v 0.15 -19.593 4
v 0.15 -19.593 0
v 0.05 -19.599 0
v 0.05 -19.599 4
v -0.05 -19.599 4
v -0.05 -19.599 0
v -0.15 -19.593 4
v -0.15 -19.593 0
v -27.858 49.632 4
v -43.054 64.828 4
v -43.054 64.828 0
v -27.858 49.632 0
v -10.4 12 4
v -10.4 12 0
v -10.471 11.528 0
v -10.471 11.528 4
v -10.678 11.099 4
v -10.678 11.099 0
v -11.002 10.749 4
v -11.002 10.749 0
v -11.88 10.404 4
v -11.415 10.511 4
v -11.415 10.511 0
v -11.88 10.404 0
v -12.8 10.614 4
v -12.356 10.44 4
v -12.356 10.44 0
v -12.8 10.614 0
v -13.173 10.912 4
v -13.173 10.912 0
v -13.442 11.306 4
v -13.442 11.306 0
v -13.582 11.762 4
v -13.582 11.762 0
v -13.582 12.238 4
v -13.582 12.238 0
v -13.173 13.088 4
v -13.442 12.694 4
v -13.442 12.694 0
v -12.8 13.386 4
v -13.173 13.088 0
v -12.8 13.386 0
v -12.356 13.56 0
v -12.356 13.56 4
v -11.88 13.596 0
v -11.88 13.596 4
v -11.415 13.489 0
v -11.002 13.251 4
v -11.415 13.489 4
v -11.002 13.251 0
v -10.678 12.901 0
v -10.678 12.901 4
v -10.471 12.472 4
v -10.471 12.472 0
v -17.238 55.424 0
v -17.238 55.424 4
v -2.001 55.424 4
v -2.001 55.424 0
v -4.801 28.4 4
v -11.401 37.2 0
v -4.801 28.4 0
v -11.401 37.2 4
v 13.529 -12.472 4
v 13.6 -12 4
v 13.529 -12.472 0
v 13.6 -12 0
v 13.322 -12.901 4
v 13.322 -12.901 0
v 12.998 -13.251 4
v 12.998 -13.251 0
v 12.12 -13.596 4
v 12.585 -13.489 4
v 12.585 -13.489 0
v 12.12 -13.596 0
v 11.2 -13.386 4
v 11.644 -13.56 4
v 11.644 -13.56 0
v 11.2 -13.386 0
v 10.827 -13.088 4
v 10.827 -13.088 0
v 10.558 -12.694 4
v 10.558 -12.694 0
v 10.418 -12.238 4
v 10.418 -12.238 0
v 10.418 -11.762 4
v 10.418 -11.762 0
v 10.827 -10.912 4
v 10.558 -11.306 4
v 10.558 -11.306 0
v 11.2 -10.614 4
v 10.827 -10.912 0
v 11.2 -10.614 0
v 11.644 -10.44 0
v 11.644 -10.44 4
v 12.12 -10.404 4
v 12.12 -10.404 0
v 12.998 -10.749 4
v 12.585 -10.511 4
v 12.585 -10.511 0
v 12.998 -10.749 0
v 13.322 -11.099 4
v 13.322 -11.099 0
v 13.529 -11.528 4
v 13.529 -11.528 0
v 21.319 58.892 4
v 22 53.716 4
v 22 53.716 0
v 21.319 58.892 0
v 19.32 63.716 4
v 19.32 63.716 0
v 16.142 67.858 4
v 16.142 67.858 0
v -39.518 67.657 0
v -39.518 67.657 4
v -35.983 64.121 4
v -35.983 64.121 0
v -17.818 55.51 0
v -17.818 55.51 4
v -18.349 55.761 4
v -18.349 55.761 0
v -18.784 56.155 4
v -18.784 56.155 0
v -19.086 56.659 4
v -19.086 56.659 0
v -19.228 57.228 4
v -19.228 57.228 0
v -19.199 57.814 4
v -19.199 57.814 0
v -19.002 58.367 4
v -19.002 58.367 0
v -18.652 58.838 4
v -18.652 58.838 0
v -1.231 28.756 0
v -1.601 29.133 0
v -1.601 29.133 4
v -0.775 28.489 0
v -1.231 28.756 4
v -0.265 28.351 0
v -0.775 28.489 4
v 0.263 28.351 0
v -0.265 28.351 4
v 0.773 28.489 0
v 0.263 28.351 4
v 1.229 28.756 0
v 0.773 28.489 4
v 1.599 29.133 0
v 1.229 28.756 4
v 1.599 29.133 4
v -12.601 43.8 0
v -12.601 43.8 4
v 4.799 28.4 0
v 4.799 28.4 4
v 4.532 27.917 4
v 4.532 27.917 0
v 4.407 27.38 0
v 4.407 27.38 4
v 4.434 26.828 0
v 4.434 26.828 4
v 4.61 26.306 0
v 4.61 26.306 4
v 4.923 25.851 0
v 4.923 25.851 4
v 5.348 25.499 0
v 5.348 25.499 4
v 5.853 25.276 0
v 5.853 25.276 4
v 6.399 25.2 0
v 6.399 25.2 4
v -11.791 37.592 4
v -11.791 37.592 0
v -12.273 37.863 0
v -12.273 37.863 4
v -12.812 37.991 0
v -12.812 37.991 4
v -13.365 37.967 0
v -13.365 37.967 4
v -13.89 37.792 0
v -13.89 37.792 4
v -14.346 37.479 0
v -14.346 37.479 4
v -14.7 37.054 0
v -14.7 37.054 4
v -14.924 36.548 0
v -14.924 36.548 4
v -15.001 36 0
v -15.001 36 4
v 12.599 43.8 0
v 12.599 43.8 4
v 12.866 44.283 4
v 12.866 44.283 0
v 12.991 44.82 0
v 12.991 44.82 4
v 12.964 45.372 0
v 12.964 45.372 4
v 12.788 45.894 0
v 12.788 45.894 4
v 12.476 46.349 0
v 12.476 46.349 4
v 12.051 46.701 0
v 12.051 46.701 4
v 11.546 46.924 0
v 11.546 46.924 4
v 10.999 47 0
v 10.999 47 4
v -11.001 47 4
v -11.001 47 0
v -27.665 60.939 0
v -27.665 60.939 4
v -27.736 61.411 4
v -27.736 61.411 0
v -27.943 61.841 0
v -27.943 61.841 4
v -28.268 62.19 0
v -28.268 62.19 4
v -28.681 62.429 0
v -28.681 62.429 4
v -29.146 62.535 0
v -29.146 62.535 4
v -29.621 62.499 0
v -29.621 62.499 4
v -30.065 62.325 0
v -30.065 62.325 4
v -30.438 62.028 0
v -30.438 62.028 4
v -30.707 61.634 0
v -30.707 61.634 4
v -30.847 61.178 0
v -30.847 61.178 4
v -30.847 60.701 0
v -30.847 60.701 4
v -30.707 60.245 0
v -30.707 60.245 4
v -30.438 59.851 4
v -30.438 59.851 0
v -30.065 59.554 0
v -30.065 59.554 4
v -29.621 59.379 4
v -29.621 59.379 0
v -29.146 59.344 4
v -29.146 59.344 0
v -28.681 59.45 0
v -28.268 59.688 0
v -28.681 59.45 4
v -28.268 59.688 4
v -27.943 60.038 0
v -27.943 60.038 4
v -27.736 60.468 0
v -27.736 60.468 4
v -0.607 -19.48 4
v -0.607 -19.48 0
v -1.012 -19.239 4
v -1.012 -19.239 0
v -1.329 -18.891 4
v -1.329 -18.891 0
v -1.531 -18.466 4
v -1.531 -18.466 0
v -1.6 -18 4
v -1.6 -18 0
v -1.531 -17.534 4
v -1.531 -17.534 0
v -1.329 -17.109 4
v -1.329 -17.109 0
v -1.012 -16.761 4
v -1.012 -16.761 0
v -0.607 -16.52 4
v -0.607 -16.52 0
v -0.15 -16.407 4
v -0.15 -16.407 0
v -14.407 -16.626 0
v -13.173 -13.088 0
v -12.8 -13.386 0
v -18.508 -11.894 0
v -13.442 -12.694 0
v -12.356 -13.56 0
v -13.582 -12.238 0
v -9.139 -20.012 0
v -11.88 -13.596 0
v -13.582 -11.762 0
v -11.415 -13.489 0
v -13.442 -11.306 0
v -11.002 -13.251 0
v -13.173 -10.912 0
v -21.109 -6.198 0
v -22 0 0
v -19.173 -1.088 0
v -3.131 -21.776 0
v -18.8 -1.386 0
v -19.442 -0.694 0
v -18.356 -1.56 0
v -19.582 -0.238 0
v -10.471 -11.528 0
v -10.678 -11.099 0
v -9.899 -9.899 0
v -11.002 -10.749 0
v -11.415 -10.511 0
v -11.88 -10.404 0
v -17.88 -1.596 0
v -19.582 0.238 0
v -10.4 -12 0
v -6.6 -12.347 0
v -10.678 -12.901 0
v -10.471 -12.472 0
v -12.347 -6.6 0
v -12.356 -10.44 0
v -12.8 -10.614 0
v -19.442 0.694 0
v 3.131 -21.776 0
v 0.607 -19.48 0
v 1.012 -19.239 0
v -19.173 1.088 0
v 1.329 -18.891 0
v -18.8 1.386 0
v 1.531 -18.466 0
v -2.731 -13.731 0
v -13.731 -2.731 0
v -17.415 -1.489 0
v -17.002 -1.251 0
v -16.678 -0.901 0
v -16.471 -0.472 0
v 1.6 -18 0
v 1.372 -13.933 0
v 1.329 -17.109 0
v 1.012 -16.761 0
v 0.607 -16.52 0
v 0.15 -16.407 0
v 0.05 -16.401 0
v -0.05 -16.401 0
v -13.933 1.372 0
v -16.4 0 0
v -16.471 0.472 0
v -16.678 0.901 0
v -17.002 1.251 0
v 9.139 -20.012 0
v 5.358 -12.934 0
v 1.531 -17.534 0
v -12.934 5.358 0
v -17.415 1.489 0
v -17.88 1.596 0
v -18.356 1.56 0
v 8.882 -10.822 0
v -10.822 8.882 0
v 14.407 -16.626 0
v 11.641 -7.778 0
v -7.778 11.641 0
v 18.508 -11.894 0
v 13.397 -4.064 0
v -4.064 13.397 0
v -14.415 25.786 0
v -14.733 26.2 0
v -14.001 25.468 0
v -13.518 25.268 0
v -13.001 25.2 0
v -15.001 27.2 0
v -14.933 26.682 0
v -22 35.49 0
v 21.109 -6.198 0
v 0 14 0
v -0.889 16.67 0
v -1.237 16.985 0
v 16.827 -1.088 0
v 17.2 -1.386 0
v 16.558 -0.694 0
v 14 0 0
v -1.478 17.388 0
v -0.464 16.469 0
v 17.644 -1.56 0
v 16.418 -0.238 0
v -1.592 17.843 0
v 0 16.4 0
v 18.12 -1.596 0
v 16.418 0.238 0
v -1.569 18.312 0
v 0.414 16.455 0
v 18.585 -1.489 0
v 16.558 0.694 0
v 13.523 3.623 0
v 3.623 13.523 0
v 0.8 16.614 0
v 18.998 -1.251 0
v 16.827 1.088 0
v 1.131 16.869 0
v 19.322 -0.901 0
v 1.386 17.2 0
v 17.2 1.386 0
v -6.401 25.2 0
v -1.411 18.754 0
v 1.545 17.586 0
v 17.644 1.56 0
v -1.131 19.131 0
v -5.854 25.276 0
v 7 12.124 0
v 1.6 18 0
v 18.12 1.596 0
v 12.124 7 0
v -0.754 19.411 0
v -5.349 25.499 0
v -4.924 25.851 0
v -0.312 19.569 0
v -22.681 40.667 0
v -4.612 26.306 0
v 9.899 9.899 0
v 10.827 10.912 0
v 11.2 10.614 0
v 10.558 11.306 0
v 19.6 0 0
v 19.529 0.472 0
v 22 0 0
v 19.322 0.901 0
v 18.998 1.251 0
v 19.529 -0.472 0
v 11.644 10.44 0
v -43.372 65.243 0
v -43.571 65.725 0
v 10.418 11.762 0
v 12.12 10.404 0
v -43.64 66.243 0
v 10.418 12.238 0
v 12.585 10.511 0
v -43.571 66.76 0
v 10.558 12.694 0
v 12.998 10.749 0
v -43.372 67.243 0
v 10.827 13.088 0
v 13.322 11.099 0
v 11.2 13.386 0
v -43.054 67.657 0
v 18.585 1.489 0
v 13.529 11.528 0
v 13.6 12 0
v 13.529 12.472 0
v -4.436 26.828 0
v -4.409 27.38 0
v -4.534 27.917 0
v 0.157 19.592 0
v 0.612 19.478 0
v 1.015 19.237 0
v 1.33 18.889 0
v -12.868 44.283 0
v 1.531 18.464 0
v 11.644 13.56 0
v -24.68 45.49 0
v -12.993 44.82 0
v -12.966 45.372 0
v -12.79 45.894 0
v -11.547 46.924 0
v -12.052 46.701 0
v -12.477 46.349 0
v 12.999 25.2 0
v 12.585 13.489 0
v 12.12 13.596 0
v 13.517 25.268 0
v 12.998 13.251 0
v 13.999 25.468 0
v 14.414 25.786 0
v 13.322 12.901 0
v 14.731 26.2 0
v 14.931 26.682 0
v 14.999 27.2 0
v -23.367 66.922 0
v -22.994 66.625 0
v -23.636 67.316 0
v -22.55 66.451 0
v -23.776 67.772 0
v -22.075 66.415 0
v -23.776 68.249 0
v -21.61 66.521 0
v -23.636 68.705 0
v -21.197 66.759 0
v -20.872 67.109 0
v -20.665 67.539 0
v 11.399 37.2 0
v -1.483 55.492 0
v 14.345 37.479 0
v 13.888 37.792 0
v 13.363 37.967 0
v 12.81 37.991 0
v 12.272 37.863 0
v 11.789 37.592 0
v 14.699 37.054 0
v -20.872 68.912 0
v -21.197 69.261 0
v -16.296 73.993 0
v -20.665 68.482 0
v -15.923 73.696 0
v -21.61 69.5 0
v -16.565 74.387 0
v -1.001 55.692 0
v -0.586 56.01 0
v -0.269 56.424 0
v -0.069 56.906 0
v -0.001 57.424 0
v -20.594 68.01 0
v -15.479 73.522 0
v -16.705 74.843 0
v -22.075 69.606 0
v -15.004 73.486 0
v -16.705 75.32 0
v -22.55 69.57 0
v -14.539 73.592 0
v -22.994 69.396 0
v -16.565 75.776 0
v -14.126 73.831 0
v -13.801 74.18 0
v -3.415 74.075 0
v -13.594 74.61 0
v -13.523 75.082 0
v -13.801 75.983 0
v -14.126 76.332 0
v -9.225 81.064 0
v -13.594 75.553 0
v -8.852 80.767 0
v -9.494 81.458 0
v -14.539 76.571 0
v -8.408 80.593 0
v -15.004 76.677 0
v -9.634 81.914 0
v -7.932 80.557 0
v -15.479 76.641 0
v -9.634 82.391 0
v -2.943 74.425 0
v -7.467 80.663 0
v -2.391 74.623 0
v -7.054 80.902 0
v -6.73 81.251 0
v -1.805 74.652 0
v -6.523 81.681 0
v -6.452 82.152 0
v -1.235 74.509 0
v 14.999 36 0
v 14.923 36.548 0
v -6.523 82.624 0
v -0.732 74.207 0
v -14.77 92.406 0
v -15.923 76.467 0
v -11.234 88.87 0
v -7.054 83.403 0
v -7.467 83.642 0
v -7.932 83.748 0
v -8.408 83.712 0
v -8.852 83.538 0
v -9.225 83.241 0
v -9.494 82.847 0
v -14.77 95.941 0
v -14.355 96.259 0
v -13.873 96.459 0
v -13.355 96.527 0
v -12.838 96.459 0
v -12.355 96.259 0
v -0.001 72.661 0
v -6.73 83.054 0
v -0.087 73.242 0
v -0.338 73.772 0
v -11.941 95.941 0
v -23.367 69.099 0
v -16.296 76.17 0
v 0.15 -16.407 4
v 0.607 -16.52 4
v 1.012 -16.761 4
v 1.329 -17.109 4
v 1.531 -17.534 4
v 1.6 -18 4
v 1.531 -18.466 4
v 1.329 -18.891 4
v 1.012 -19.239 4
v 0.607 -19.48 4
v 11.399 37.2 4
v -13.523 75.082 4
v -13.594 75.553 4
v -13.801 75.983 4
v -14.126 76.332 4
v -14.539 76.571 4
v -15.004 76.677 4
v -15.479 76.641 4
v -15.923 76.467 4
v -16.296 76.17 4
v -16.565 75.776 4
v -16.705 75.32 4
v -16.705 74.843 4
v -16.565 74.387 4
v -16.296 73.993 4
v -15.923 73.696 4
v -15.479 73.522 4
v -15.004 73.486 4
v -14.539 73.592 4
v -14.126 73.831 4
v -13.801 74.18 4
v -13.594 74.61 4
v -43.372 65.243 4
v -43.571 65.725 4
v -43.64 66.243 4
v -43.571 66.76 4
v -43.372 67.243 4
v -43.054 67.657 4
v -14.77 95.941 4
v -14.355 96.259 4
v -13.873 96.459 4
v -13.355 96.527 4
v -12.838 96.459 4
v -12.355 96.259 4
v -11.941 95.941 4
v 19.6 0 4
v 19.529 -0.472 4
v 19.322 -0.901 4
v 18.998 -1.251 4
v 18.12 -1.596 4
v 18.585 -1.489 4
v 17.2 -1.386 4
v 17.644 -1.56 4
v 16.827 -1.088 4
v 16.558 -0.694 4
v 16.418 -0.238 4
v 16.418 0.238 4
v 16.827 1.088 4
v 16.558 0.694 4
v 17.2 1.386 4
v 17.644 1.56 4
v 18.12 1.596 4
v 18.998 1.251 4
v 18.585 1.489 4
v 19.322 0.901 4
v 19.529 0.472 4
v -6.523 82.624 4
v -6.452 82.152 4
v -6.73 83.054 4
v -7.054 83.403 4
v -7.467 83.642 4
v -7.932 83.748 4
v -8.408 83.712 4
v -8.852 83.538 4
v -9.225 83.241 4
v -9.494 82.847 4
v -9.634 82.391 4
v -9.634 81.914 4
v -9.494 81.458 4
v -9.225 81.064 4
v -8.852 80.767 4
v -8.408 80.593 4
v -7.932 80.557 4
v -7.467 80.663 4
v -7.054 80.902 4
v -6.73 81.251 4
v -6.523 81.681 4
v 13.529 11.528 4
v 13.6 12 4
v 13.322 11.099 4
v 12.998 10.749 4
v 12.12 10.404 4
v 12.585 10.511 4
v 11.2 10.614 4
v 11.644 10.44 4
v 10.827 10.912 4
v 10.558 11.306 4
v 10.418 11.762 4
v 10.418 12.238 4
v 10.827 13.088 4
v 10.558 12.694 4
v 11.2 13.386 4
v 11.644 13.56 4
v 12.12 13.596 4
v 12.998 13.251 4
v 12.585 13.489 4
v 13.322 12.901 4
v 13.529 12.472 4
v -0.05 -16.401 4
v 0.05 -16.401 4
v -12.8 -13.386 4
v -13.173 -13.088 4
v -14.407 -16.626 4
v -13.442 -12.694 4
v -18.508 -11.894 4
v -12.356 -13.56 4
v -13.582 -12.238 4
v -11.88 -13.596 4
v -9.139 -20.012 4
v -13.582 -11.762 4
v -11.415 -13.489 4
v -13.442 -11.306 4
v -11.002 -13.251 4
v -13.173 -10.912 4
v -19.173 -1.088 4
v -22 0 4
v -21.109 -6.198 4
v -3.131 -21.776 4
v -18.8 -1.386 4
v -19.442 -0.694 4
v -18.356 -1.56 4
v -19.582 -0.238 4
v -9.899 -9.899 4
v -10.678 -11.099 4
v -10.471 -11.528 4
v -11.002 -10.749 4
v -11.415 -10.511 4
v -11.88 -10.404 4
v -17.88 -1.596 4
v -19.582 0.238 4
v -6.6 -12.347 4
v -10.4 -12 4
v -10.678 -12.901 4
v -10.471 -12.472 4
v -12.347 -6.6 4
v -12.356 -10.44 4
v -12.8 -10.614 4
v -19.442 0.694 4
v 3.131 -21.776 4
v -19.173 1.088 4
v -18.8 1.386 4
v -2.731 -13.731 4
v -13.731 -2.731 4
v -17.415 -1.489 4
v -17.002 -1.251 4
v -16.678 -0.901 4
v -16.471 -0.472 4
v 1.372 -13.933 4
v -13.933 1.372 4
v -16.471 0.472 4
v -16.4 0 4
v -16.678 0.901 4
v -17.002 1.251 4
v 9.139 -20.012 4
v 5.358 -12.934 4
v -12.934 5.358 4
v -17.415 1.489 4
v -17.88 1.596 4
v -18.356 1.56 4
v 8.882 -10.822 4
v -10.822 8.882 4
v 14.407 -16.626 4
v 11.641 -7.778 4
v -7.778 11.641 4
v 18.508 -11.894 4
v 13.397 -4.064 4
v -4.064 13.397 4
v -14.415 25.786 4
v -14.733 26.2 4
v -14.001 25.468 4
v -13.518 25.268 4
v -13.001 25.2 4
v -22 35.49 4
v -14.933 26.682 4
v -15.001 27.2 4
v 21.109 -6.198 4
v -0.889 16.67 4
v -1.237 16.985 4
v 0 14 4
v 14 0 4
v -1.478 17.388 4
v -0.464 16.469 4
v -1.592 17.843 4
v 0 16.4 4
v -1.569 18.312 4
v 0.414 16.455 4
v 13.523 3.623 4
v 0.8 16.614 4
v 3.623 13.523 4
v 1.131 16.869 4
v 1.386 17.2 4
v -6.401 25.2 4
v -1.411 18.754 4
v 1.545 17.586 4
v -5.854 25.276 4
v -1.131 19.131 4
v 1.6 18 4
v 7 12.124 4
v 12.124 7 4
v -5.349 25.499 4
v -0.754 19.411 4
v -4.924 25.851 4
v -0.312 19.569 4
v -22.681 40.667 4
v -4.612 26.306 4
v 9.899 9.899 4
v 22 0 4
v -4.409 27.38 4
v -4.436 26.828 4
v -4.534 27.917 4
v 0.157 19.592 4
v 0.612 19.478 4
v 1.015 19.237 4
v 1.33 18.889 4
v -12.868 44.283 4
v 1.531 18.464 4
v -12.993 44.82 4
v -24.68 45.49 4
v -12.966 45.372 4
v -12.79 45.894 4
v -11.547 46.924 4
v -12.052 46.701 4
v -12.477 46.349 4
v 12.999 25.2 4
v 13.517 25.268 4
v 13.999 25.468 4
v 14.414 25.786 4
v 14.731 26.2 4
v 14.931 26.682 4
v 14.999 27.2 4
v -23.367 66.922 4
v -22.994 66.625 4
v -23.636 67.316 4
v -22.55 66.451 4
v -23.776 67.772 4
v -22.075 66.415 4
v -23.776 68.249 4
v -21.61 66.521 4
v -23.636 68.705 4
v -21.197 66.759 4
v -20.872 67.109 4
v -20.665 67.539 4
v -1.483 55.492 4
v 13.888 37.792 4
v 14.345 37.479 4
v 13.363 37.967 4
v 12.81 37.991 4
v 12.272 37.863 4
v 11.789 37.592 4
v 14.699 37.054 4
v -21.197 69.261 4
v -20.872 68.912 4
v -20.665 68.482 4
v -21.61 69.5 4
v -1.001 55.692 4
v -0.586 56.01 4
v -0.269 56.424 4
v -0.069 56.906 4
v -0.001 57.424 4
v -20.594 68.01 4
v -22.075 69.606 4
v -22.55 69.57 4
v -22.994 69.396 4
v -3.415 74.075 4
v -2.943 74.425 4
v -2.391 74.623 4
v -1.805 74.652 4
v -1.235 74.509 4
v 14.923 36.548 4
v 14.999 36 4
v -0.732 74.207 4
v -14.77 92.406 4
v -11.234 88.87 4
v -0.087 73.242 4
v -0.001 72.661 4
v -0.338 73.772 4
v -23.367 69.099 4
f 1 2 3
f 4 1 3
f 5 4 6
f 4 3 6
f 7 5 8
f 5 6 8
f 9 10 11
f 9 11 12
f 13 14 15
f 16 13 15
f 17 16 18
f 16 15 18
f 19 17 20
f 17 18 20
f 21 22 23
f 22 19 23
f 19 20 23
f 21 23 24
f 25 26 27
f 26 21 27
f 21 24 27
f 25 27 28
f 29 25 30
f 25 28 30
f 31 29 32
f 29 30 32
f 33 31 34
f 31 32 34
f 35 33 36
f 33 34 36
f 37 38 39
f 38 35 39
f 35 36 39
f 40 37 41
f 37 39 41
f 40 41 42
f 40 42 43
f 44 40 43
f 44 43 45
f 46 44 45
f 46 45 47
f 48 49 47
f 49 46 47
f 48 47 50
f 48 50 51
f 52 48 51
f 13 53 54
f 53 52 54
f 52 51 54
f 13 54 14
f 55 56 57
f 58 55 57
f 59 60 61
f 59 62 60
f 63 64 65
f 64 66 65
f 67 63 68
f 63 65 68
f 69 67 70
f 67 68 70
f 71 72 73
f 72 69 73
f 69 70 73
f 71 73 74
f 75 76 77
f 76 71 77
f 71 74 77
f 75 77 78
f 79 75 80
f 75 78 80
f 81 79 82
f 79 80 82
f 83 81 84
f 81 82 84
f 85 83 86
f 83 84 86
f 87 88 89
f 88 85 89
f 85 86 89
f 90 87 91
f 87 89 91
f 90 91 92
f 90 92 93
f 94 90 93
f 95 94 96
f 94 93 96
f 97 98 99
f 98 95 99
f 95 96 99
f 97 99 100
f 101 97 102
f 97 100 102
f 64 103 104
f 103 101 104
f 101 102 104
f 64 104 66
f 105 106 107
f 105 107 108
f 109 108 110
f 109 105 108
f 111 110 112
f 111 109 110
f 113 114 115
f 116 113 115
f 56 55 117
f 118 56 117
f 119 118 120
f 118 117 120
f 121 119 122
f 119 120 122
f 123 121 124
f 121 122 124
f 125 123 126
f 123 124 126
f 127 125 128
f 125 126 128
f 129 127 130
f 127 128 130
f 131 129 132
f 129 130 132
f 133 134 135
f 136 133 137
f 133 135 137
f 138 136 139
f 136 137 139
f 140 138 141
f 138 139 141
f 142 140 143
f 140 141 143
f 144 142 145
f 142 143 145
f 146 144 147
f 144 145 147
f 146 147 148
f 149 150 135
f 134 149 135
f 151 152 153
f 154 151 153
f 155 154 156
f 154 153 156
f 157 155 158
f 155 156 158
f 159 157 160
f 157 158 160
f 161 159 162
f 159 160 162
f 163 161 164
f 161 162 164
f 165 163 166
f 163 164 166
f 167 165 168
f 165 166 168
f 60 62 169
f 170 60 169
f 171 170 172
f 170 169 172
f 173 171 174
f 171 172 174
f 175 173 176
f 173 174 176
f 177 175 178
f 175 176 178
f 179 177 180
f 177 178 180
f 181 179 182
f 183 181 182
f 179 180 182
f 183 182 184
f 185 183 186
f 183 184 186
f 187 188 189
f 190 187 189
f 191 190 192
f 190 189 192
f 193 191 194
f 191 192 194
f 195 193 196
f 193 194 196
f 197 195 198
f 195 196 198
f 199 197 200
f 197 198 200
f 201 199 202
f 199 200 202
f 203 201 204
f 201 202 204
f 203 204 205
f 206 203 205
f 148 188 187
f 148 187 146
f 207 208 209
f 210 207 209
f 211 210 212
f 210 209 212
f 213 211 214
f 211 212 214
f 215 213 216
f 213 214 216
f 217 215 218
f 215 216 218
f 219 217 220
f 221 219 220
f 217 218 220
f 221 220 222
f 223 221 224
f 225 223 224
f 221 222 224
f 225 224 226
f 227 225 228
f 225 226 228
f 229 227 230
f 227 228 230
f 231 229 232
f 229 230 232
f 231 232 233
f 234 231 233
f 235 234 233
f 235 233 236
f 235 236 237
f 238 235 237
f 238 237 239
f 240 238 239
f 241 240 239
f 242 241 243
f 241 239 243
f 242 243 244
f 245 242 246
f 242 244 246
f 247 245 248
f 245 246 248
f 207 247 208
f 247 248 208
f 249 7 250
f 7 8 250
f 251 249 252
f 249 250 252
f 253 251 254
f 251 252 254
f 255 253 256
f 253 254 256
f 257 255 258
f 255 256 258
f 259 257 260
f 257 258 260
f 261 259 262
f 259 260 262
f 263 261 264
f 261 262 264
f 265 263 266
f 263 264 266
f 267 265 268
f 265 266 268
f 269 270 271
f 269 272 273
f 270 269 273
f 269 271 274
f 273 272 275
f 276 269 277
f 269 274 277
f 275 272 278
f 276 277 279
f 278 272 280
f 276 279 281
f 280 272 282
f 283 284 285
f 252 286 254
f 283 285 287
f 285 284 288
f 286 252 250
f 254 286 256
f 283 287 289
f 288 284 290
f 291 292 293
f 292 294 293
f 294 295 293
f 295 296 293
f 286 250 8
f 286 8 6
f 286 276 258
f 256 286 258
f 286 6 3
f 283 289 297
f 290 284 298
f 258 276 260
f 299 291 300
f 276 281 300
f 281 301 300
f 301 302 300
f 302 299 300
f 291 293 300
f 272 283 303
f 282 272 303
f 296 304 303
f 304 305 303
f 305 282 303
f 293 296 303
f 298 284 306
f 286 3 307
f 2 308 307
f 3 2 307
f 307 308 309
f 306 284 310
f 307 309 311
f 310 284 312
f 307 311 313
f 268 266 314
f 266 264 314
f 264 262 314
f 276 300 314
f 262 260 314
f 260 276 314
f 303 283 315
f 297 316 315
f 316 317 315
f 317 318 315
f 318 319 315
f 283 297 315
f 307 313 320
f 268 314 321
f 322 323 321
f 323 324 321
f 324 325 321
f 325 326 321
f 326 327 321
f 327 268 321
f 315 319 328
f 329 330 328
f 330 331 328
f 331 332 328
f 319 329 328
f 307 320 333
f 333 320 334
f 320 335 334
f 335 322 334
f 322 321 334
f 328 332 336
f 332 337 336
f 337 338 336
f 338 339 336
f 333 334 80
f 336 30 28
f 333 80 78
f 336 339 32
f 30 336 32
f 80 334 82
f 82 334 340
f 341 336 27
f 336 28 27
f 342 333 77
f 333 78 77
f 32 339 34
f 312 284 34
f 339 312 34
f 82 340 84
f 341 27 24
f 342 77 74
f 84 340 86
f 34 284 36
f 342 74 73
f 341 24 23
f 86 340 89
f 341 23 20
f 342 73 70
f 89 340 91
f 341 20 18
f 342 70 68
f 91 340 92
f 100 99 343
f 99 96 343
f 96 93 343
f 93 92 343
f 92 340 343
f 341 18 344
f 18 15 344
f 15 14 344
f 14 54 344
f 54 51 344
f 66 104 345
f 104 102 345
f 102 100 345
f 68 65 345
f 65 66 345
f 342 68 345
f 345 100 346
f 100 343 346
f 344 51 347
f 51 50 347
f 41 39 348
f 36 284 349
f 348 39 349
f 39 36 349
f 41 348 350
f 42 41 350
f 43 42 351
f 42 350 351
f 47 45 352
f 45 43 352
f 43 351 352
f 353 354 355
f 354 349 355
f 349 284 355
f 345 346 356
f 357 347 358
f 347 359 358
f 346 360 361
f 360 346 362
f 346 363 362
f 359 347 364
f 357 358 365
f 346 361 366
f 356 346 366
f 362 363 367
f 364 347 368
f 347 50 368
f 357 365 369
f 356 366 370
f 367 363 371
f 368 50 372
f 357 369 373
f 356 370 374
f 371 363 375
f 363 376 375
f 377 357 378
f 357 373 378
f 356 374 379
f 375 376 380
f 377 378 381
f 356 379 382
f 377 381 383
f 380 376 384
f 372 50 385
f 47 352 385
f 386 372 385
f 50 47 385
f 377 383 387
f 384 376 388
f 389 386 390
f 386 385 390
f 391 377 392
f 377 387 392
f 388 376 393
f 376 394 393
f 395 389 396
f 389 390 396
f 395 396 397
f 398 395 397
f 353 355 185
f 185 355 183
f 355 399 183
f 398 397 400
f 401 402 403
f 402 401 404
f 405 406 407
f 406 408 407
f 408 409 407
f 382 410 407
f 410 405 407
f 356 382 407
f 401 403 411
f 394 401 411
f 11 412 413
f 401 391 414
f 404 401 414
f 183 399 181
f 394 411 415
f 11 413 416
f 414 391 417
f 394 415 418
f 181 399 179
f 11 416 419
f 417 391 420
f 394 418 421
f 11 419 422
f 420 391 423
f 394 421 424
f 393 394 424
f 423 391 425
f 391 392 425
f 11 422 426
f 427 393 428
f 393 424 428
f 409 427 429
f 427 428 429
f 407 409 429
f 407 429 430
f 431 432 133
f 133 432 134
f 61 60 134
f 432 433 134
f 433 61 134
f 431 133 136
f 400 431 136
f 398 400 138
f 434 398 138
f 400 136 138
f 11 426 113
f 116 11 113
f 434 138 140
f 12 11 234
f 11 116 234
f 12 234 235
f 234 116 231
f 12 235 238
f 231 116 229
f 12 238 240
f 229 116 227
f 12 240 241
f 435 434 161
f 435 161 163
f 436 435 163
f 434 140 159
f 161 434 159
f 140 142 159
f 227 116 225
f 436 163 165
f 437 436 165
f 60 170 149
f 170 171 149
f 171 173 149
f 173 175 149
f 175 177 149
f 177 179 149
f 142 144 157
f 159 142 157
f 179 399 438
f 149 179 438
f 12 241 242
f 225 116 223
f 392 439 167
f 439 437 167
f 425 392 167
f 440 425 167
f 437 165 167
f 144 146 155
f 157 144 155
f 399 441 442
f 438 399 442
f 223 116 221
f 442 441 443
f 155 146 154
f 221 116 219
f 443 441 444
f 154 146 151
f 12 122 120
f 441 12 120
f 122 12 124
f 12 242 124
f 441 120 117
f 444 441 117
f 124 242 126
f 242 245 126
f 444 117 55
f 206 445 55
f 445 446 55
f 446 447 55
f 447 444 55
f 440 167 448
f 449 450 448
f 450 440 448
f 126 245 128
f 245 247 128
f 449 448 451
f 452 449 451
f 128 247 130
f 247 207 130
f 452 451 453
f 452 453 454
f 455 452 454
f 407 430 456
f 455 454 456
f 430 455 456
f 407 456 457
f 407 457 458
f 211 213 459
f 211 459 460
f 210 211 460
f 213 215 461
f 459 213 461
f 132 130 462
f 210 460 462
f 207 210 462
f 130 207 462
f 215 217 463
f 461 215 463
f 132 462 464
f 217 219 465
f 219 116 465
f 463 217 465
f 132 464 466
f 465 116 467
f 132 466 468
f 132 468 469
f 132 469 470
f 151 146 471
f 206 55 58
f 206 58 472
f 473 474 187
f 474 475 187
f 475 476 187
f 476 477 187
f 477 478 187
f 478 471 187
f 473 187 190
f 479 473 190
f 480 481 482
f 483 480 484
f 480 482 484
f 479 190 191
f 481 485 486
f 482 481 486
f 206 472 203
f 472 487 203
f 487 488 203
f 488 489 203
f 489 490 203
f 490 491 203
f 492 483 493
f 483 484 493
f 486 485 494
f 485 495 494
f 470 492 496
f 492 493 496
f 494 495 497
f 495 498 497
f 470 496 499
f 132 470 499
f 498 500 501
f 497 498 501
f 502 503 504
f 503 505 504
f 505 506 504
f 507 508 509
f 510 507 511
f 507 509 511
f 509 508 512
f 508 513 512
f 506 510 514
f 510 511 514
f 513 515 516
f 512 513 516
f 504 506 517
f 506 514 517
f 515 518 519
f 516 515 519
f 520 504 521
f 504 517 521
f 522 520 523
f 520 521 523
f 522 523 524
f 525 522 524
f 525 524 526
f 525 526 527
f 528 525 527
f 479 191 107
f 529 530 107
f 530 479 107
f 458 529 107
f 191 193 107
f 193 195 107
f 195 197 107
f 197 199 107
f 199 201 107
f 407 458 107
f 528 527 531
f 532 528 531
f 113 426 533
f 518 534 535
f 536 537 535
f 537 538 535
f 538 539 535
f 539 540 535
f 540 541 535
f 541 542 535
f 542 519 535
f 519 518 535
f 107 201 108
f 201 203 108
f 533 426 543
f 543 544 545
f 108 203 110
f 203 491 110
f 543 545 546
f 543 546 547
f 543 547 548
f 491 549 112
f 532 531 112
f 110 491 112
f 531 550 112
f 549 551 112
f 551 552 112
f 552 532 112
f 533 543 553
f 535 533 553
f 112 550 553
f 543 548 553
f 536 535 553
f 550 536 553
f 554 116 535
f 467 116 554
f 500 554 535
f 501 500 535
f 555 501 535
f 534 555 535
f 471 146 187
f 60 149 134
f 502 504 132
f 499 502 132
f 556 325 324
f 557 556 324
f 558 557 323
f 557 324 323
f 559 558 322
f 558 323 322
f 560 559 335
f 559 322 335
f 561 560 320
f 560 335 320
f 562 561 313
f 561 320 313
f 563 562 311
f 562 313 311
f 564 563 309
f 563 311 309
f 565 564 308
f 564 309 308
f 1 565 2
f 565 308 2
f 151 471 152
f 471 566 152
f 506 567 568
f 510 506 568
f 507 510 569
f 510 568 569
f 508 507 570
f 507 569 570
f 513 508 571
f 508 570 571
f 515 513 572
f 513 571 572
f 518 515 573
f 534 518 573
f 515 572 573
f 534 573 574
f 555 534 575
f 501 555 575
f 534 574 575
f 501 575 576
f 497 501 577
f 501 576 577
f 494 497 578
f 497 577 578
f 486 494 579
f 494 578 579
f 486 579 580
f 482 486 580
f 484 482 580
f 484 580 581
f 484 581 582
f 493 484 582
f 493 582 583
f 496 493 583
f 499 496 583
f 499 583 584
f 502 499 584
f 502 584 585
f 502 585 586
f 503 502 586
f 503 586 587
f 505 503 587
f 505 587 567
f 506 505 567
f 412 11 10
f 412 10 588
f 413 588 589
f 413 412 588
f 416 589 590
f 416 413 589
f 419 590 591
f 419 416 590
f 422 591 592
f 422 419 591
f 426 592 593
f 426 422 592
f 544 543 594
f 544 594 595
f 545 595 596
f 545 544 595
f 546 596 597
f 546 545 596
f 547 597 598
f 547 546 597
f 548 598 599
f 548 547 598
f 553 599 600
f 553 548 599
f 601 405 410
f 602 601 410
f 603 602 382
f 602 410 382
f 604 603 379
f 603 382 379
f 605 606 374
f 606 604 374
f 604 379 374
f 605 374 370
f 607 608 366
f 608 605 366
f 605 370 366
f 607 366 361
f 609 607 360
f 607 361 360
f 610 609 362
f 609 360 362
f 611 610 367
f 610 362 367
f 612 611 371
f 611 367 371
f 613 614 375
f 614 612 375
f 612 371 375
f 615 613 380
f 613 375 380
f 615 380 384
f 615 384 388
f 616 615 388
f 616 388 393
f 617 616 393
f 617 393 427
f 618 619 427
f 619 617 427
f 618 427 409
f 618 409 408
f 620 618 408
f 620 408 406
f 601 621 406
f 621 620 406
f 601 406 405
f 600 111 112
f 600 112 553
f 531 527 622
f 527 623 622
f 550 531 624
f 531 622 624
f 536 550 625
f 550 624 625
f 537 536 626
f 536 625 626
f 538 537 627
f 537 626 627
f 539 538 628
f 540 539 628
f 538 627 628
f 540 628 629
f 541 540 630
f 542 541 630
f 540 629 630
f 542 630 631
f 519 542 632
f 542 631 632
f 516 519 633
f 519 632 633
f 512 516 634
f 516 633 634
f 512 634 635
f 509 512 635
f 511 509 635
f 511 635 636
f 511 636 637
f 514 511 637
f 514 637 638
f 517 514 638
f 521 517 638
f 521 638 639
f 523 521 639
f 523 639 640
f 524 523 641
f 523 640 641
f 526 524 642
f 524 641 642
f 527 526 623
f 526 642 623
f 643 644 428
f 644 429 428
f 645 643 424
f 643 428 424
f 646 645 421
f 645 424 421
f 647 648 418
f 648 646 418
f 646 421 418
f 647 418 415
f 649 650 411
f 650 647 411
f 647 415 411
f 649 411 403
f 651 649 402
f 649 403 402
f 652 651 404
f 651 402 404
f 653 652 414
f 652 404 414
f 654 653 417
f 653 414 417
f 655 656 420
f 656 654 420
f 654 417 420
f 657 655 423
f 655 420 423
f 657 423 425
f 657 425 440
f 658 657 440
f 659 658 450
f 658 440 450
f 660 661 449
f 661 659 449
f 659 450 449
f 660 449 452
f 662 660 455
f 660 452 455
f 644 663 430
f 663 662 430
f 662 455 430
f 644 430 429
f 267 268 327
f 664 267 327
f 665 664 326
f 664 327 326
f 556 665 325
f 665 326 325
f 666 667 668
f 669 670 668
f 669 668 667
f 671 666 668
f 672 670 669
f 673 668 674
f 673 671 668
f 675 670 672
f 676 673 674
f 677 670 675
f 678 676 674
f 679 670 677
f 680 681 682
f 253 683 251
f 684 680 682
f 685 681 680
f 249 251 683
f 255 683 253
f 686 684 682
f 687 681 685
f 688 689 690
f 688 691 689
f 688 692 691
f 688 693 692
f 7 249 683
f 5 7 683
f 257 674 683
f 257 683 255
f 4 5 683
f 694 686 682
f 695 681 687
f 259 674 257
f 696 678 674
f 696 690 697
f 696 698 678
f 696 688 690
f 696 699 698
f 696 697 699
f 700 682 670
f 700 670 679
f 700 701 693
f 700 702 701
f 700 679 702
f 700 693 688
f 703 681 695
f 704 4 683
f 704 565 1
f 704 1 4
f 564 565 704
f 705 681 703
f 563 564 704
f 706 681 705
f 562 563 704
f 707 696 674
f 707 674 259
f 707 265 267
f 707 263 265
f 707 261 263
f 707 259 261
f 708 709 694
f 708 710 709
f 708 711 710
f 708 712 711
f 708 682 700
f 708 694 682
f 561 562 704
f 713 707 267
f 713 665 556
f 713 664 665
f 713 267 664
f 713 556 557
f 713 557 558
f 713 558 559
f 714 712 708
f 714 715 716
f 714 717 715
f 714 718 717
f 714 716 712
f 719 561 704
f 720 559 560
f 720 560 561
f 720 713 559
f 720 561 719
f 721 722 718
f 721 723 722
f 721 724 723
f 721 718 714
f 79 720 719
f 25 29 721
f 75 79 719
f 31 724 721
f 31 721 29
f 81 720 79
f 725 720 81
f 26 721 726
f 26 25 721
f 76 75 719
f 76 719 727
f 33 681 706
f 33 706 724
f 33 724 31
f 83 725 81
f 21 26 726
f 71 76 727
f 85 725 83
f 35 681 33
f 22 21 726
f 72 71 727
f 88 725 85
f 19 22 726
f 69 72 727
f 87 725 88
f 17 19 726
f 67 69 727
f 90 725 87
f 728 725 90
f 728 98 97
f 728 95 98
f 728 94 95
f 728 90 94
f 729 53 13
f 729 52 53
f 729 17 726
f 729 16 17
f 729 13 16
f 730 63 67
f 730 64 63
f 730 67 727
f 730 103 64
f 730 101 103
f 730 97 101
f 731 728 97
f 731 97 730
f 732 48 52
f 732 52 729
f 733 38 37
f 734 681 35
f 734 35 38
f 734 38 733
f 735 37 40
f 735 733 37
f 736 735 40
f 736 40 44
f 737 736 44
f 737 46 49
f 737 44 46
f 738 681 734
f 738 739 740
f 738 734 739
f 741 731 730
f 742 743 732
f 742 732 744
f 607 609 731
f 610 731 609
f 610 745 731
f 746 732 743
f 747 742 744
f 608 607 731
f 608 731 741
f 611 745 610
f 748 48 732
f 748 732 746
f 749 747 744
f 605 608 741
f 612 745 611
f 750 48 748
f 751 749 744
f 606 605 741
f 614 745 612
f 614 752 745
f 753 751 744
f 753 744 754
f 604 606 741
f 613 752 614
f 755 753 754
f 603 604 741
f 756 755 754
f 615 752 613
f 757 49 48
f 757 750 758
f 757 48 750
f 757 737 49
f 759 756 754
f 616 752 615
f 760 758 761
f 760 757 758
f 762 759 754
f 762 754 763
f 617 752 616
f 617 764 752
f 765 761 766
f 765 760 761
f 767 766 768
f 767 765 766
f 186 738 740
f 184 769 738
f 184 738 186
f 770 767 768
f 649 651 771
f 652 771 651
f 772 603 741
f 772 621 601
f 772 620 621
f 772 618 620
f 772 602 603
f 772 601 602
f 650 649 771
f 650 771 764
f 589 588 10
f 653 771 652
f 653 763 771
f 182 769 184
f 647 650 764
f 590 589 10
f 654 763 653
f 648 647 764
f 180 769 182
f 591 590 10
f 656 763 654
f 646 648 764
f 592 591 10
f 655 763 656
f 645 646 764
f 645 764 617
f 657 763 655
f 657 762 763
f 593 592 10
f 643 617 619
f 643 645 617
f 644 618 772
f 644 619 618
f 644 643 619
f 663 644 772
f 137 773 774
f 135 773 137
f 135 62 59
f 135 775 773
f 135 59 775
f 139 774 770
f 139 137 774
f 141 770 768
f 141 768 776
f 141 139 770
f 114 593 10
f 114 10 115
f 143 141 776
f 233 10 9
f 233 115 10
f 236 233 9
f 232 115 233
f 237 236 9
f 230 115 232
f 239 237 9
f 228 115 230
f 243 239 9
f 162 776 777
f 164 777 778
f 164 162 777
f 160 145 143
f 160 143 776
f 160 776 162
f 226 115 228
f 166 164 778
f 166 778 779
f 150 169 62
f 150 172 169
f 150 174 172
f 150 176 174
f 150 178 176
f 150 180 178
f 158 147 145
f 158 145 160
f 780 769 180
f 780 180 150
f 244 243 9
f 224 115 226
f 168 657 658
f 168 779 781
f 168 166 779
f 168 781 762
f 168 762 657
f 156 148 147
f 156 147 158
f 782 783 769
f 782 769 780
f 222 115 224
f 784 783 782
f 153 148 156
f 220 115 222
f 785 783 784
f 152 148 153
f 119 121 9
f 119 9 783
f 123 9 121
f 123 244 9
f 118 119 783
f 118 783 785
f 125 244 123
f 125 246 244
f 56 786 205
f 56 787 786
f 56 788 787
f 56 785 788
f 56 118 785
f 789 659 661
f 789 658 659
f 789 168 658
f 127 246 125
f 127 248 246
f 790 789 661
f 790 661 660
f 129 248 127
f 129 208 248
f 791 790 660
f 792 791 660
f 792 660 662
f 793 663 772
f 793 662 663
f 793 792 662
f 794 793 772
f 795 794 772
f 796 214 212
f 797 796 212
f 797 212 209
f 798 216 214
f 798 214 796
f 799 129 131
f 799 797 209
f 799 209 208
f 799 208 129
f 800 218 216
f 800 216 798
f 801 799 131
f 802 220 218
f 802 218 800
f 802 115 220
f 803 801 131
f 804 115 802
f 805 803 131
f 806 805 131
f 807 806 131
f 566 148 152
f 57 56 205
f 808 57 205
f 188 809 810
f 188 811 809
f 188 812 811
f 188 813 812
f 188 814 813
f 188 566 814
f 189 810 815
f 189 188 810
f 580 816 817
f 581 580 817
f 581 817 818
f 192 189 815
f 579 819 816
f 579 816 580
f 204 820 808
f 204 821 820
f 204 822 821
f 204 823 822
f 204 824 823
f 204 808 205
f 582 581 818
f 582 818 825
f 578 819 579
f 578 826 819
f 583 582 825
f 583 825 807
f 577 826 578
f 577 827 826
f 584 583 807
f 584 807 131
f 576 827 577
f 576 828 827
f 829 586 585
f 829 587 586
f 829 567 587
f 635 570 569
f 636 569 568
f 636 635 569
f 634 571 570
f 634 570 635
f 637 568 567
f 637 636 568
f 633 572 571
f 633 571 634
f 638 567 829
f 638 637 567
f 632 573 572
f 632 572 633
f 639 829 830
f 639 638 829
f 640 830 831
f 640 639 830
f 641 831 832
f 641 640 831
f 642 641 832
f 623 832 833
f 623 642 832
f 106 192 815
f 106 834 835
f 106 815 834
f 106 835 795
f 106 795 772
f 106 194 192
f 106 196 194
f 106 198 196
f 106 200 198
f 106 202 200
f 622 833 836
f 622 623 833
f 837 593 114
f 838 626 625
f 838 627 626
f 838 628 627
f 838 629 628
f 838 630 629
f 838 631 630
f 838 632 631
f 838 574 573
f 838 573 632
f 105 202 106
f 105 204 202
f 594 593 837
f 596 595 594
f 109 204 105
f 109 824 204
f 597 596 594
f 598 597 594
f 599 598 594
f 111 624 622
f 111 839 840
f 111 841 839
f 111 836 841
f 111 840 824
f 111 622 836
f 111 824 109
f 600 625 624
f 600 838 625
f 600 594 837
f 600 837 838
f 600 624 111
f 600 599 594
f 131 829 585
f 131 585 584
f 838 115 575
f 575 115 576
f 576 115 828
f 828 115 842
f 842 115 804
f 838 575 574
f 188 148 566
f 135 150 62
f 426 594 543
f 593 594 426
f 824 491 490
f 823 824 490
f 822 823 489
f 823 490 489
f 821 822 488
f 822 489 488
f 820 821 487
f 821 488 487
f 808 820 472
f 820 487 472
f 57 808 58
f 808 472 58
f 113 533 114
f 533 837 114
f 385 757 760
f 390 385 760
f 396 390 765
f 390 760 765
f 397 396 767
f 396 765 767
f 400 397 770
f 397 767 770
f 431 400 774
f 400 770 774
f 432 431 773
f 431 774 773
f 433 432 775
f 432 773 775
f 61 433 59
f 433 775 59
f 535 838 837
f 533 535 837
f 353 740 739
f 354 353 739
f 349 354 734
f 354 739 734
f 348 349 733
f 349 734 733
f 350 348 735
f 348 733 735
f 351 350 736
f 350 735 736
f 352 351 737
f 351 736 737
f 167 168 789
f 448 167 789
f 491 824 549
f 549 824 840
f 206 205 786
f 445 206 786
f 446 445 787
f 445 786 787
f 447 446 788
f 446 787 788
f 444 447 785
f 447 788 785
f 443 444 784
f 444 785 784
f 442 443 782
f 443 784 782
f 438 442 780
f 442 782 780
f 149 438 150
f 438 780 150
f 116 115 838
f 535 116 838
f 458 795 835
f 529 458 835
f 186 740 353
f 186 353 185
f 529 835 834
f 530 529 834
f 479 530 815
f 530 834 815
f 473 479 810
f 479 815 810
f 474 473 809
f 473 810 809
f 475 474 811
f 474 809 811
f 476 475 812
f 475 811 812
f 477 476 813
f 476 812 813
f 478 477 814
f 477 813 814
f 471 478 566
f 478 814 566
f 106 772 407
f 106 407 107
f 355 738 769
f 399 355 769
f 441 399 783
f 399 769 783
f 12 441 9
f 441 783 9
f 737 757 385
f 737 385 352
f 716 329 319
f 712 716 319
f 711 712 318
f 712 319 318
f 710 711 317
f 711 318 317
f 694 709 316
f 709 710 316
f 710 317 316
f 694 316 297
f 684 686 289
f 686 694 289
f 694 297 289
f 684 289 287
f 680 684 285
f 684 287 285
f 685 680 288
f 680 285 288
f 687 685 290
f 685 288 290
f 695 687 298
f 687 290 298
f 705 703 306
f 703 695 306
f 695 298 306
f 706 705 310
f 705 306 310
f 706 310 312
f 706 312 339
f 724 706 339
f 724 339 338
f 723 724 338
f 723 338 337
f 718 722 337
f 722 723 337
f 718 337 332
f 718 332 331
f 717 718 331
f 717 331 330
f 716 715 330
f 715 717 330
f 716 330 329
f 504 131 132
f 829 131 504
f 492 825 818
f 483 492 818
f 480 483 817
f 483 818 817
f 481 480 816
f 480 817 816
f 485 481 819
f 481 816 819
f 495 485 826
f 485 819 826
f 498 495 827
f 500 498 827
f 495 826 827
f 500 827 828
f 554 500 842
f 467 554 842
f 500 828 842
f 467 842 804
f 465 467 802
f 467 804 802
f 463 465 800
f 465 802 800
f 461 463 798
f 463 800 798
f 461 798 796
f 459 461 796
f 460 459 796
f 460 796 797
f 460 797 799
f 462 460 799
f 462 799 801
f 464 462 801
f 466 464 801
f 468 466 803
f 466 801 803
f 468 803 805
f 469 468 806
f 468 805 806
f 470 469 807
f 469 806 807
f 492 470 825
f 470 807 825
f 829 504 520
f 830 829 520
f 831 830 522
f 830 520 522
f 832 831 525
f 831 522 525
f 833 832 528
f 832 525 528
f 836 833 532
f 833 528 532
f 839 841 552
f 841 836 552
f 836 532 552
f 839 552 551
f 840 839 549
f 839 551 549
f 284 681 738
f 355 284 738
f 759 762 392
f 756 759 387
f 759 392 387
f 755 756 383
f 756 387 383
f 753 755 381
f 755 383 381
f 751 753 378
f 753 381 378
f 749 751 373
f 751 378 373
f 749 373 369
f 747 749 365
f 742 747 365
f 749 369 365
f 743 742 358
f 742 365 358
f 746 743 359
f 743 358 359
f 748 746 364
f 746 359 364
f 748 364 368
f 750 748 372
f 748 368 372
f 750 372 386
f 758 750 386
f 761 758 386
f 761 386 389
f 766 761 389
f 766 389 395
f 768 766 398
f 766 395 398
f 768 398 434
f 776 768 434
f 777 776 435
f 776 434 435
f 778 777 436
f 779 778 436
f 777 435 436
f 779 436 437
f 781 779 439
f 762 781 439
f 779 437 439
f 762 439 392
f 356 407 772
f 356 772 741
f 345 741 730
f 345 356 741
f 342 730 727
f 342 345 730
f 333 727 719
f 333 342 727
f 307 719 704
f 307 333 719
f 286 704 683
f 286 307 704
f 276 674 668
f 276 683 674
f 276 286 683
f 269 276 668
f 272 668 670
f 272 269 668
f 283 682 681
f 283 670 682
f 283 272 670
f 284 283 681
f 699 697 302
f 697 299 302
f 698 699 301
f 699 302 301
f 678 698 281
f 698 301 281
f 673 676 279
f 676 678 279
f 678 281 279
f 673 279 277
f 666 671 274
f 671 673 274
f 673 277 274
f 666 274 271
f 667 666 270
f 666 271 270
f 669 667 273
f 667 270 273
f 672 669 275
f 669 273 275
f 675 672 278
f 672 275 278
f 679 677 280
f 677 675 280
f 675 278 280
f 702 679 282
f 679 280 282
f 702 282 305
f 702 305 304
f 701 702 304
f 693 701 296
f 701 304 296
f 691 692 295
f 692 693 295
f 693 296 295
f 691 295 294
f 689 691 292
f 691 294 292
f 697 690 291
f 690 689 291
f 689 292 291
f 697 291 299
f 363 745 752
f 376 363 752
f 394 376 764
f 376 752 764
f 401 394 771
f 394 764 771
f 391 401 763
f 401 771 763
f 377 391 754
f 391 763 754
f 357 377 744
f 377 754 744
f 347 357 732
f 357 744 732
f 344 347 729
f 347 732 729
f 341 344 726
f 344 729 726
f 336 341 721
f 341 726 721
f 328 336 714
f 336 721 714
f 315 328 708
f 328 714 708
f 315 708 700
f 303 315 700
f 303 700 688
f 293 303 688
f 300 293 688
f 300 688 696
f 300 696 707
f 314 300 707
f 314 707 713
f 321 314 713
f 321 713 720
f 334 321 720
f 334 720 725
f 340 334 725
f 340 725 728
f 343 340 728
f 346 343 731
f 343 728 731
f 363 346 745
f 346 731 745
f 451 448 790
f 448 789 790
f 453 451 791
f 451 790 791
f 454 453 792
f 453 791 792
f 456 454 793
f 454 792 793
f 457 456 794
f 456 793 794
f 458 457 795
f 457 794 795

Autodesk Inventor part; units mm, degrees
ref_plane "YZ Plane" through (0, 0, 0) normal (1, 0, 0) x (0, 1, 0)
ref_plane "XZ Plane" through (0, 0, 0) normal (0, 1, 0) x (-1, 0, 0)
ref_plane "XY Plane" through (0, 0, 0) normal (0, 0, 1) x (1, 0, 0)
sketch "스케치1" plane through (0, 0, 0) normal (0, 0, 1) x (1, 0, 0)
  circle A0 centre (0, 0) radius 22
  line L0 (0, 0) -> (0, 18)
  line L1 (-0.15, -20.7995) -> (-0.15, -19.593)
  arc A1 (-0.15, -16.407) -> (-0.15, -19.593) centre (0, -18) ccw
  line L2 (-0.15, -16.407) -> (-0.15, -12.9991)
  arc A2 (0.15, -12.9991) -> (-0.15, -12.9991) centre (0, 0) ccw
  line L3 (0.15, -16.407) -> (0.15, -12.9991)
  arc A3 (0.15, -19.593) -> (0.15, -16.407) centre (0, -18) ccw
  line L4 (0.15, -20.7995) -> (0.15, -19.593)
  circle A4 centre (12, 12) radius 1.6
  circle A5 centre (-18, 0) radius 1.6
  circle A6 centre (-12, 12) radius 1.6
  circle A7 centre (-12, -12) radius 1.6
  circle A8 centre (18, 0) radius 1.6
  circle A9 centre (12, -12) radius 1.6
  circle A10 centre (0, 18) radius 1.6
  circle A11 centre (0, 0) radius 12.5
  circle A12 centre (0, -18) radius 1.6
  point P0 (0.15, -19.593)
  dimension "d0" = 44
  dimension "d1" = 18
extrude "돌출1" add sketch "스케치1" along normal blind 4 contours A0 | A2 L3 A12 L2 | A10 | A11 | A3 A12 A1 | A4 | A5 | A6 | A7 | A8 | A9
sketch "스케치2" plane through (0, 0, 4) normal (0, 0, 1) x (1, 0, 0)
  circle A0 centre (0, 0) radius 22
  circle A1 centre (0, 0) radius 22
  line L0 (0, -22) -> (0, 58)
  line L1 (22, 0) -> (22, 53.7157)
  line L2 (16.1421, 67.8579) -> (-6.2843, 90.2843)
  line L3 (22, 62) -> (53.7157, 62) construction
  line L4 (-6.2843, 90.2843) -> (-37.397, 59.1716)
  line L5 (-22, 0) -> (-22, 35.4903)
  line L6 (-27.8579, 49.6325) -> (-37.397, 59.1716)
  arc A2 (-22, 35.4903) -> (-27.8579, 49.6325) centre (-42, 35.4903) ccw
  arc A3 (22, 53.7157) -> (16.1421, 67.8579) centre (2, 53.7157) ccw
  point P0 (-22, 43.7746)
  dimension "d9" = 80
  dimension "d46" = 62
  dimension "d48" = 135
  dimension "d50" = 40
  dimension "d57" = 20
  dimension "d92" = 44
sketch "스케치4" plane through (0, 0, 4) normal (0, 0, 1) x (1, 0, 0)
  circle A0 centre (0, 0) radius 14
  dimension "d32" = 28
extrude "돌출4" cut sketch "스케치4" against normal blind 4
sketch "스케치5" plane through (0, 0, 4) normal (0, 0, 1) x (1, 0, 0)
  line L0 (-0.0007, 55) -> (-0.0007, 47)
  line L1 (-0.0007, 47) -> (10.9993, 47)
  line L2 (-0.0007, 47) -> (-11.0007, 47)
  line L3 (-0.0007, 47) -> (-0.0007, 27)
  line L4 (-12.6007, 43.8) -> (-1.6007, 29.1333)
  line L5 (12.5993, 43.8) -> (1.5993, 29.1333)
  line L6 (11.3993, 37.2) -> (4.7993, 28.4)
  line L7 (6.3993, 25.2) -> (12.9993, 25.2)
  line L8 (14.9993, 27.2) -> (14.9993, 36)
  arc A0 (-11.0007, 47) -> (-12.6007, 43.8) centre (-11.0007, 45) ccw
  arc A1 (-1.6007, 29.1333) -> (1.5993, 29.1333) centre (-0.0007, 30.3333) ccw
  arc A2 (12.5993, 43.8) -> (10.9993, 47) centre (10.9993, 45) ccw
  arc A3 (14.9993, 36) -> (11.3993, 37.2) centre (12.9993, 36) ccw
  arc A4 (12.9993, 25.2) -> (14.9993, 27.2) centre (12.9993, 27.2) ccw
  arc A5 (4.7993, 28.4) -> (6.3993, 25.2) centre (6.3993, 27.2) ccw
  line L9 (-11.4007, 37.2) -> (-4.8007, 28.4)
  line L10 (-6.4007, 25.2) -> (-13.0007, 25.2)
  line L11 (-15.0007, 27.2) -> (-15.0007, 36)
  arc A6 (-11.4007, 37.2) -> (-15.0007, 36) centre (-13.0007, 36) ccw
  arc A7 (-15.0007, 27.2) -> (-13.0007, 25.2) centre (-13.0007, 27.2) ccw
  arc A8 (-6.4007, 25.2) -> (-4.8007, 28.4) centre (-6.4007, 27.2) ccw
  point P0 (0, 0)
  point P1 (14.9993, 47)
  point P2 (-15.0007, 47)
  point P3 (14.9993, 42)
  dimension "d35" = 8
  dimension "d36" = 15
  dimension "d37" = 15
  dimension "d38" = 20
  dimension "d39" = 5
  dimension "d41" = 2
extrude "돌출7" add sketch "스케치2" against normal blind 4 contours L5 A2 L6 L4 L2 A3 L1 A0
extrude "돌출8" cut sketch "스케치5" against normal blind 4
extrude "돌출9" cut sketch "스케치1" along normal blind 4 contours A10 | A3 A12 A1 | A4 | A5 | A6 | A7 | A8 | A9
sketch "스케치9" plane through (0, 0, 4) normal (0, 0, 1) x (1, 0, 0)
  circle A0 centre (-12, 12) radius 1.6
  circle A1 centre (12, -12) radius 1.6
  circle A2 centre (0, -18) radius 1.6
  circle A3 centre (0, 18) radius 1.6
  circle A4 centre (-18, 0) radius 1.6
  circle A5 centre (18, 0) radius 1.6
  circle A6 centre (-12, -12) radius 1.6
  circle A7 centre (12, 12) radius 1.6
  line L0 (4.7993, 28.4) -> (11.3993, 37.2)
  arc A8 (14.9993, 36) -> (11.3993, 37.2) centre (12.9993, 36) ccw
  line L1 (14.9993, 36) -> (14.9993, 27.2)
  arc A9 (12.9993, 25.2) -> (14.9993, 27.2) centre (12.9993, 27.2) ccw
  line L2 (12.9993, 25.2) -> (6.3993, 25.2)
  arc A10 (4.7993, 28.4) -> (6.3993, 25.2) centre (6.3993, 27.2) ccw
  arc A11 (-6.4007, 25.2) -> (-4.8007, 28.4) centre (-6.4007, 27.2) ccw
  line L3 (-6.4007, 25.2) -> (-13.0007, 25.2)
  arc A12 (-15.0007, 27.2) -> (-13.0007, 25.2) centre (-13.0007, 27.2) ccw
  line L4 (-15.0007, 27.2) -> (-15.0007, 36)
  arc A13 (-11.4007, 37.2) -> (-15.0007, 36) centre (-13.0007, 36) ccw
  line L5 (-11.4007, 37.2) -> (-4.8007, 28.4)
  line L6 (12.5993, 43.8) -> (1.5993, 29.1333)
  arc A14 (-1.6007, 29.1333) -> (1.5993, 29.1333) centre (-0.0007, 30.3333) ccw
  line L7 (-1.6007, 29.1333) -> (-12.6007, 43.8)
  arc A15 (-11.0007, 47) -> (-12.6007, 43.8) centre (-11.0007, 45) ccw
  line L8 (-11.0007, 47) -> (10.9993, 47)
  arc A16 (12.5993, 43.8) -> (10.9993, 47) centre (10.9993, 45) ccw
  circle A17 centre (0, 0) radius 14
  arc A18 (-22, 0) -> (22, 0) centre (0, 0) ccw
  line L9 (22, 0) -> (22, 53.7157)
  arc A19 (22, 53.7157) -> (16.1421, 67.8579) centre (2, 53.7157) ccw
  line L10 (16.1421, 67.8579) -> (-6.2843, 90.2843)
  line L11 (-6.2843, 90.2843) -> (-37.397, 59.1716)
  line L12 (-37.397, 59.1716) -> (-27.8579, 49.6325)
  arc A20 (-22, 35.4903) -> (-27.8579, 49.6325) centre (-42, 35.4903) ccw
  line L13 (-22, 35.4903) -> (-22, 0)
  circle A21 centre (-29.2652, 60.9393) radius 1.6
  circle A22 centre (-22.1942, 68.0104) radius 1.6
  circle A23 centre (-15.1231, 75.0815) radius 1.6
  circle A24 centre (-8.052, 82.1525) radius 1.6
  dimension "d73" = 3.2
  dimension "d74" = 3.2
  dimension "d76" = 3.2
  dimension "d77" = 3.2
  dimension "d78" = 4.5
  dimension "d79" = 4.5
  dimension "d81" = 4.5
  dimension "d82" = 4.5
  dimension "d83" = 10
  dimension "d85" = 10
  dimension "d88" = 7
  dimension "d91" = 7
extrude "돌출10" cut sketch "스케치9" against normal blind 10 contours A21 | A22 | A23 | A24
sketch "스케치10" plane through (0, 0, 4) normal (0, 0, 1) x (1, 0, 0)
  circle A0 centre (-15.1231, 75.0815) radius 1.6
  circle A1 centre (-22.1942, 68.0104) radius 1.6
  circle A2 centre (-8.052, 82.1525) radius 1.6
  circle A3 centre (-29.2652, 60.9393) radius 1.6
  circle A4 centre (-12, 12) radius 1.6
  circle A5 centre (12, -12) radius 1.6
  circle A6 centre (0, -18) radius 1.6
  circle A7 centre (0, 18) radius 1.6
  circle A8 centre (-18, 0) radius 1.6
  circle A9 centre (18, 0) radius 1.6
  circle A10 centre (-12, -12) radius 1.6
  circle A11 centre (12, 12) radius 1.6
  line L0 (4.7993, 28.4) -> (11.3993, 37.2)
  arc A12 (14.9993, 36) -> (11.3993, 37.2) centre (12.9993, 36) ccw
  line L1 (14.9993, 36) -> (14.9993, 27.2)
  arc A13 (12.9993, 25.2) -> (14.9993, 27.2) centre (12.9993, 27.2) ccw
  line L2 (12.9993, 25.2) -> (6.3993, 25.2)
  arc A14 (4.7993, 28.4) -> (6.3993, 25.2) centre (6.3993, 27.2) ccw
  arc A15 (-6.4007, 25.2) -> (-4.8007, 28.4) centre (-6.4007, 27.2) ccw
  line L3 (-6.4007, 25.2) -> (-13.0007, 25.2)
  arc A16 (-15.0007, 27.2) -> (-13.0007, 25.2) centre (-13.0007, 27.2) ccw
  line L4 (-15.0007, 27.2) -> (-15.0007, 36)
  arc A17 (-11.4007, 37.2) -> (-15.0007, 36) centre (-13.0007, 36) ccw
  line L5 (-11.4007, 37.2) -> (-4.8007, 28.4)
  line L6 (12.5993, 43.8) -> (1.5993, 29.1333)
  arc A18 (-1.6007, 29.1333) -> (1.5993, 29.1333) centre (-0.0007, 30.3333) ccw
  line L7 (-1.6007, 29.1333) -> (-12.6007, 43.8)
  arc A19 (-11.0007, 47) -> (-12.6007, 43.8) centre (-11.0007, 45) ccw
  line L8 (-11.0007, 47) -> (10.9993, 47)
  arc A20 (12.5993, 43.8) -> (10.9993, 47) centre (10.9993, 45) ccw
  circle A21 centre (0, 0) radius 14
  arc A22 (-22, 0) -> (22, 0) centre (0, 0) ccw
  line L9 (22, 0) -> (22, 53.7157)
  arc A23 (22, 53.7157) -> (16.1421, 67.8579) centre (2, 53.7157) ccw
  line L10 (16.1421, 67.8579) -> (-6.2843, 90.2843)
  line L11 (-6.2843, 90.2843) -> (-37.397, 59.1716)
  line L12 (-37.397, 59.1716) -> (-27.8579, 49.6325)
  arc A24 (-22, 35.4903) -> (-27.8579, 49.6325) centre (-42, 35.4903) ccw
  line L13 (-22, 35.4903) -> (-22, 0)
  line L14 (-6.2843, 90.2843) -> (16.1421, 67.8579)
  line L15 (-6.2843, 90.2843) -> (-13.3553, 97.3553)
  line L16 (-13.3553, 97.3553) -> (-44.468, 66.2426)
  line L17 (-44.468, 66.2426) -> (-37.397, 59.1716)
  line L18 (-14.7696, 92.4056) -> (-39.5183, 67.6569)
  line L19 (-6.2843, 90.2843) -> (-37.397, 59.1716)
  line L20 (-39.5183, 67.6569) -> (-35.9828, 64.1213)
  line L21 (-35.9828, 64.1213) -> (-11.234, 88.8701)
  line L22 (-11.234, 88.8701) -> (-14.7696, 92.4056)
  point P0 (-37.397, 59.1716)
  dimension "d93" = 10
  dimension "d95" = 5
  dimension "d96" = 35
  dimension "d97" = 2.5
  dimension "d99" = 4.5
extrude "돌출11" add sketch "스케치10" against normal blind 4 contours L17 L16 L15 L11
fillet "모깎기1" radius 2 2 edges at (-13.3553, 97.3553, 2) (-44.468, 66.2426, 2)
sketch "스케치11" plane through (0, 0, 4) normal (0, 0, 1) x (1, 0, 0)
  arc A0 (-43.0538, 67.6569) -> (-43.0538, 64.8284) centre (-41.6396, 66.2426) ccw
  line L0 (-43.0538, 64.8284) -> (-27.8579, 49.6325)
  arc A1 (-22, 35.4903) -> (-27.8579, 49.6325) centre (-42, 35.4903) ccw
  line L1 (-22, 35.4903) -> (-22, 0)
  arc A2 (-22, 0) -> (22, 0) centre (0, 0) ccw
  line L2 (22, 0) -> (22, 53.7157)
  arc A3 (22, 53.7157) -> (16.1421, 67.8579) centre (2, 53.7157) ccw
  line L3 (16.1421, 67.8579) -> (-11.9411, 95.9411)
  arc A4 (-11.9411, 95.9411) -> (-14.7696, 95.9411) centre (-13.3553, 94.5269) ccw
  line L4 (-14.7696, 95.9411) -> (-43.0538, 67.6569)
  line L5 (-35.9828, 64.1213) -> (-39.5183, 67.6569)
  line L6 (-39.5183, 67.6569) -> (-14.7696, 92.4056)
  line L7 (-14.7696, 92.4056) -> (-11.234, 88.8701)
  line L8 (-11.234, 88.8701) -> (-35.9828, 64.1213)
  circle A5 centre (-15.1231, 75.0815) radius 1.6
  circle A6 centre (-22.1942, 68.0104) radius 1.6
  circle A7 centre (-8.052, 82.1525) radius 1.6
  circle A8 centre (-29.2652, 60.9393) radius 1.6
  circle A9 centre (-12, 12) radius 1.6
  circle A10 centre (12, -12) radius 1.6
  circle A11 centre (0, -18) radius 1.6
  circle A12 centre (0, 18) radius 1.6
  circle A13 centre (-18, 0) radius 1.6
  circle A14 centre (18, 0) radius 1.6
  circle A15 centre (-12, -12) radius 1.6
  circle A16 centre (12, 12) radius 1.6
  arc A17 (4.7993, 28.4) -> (6.3993, 25.2) centre (6.3993, 27.2) ccw
  line L9 (4.7993, 28.4) -> (11.3993, 37.2)
  arc A18 (14.9993, 36) -> (11.3993, 37.2) centre (12.9993, 36) ccw
  line L10 (14.9993, 36) -> (14.9993, 27.2)
  arc A19 (12.9993, 25.2) -> (14.9993, 27.2) centre (12.9993, 27.2) ccw
  line L11 (12.9993, 25.2) -> (6.3993, 25.2)
  arc A20 (-6.4007, 25.2) -> (-4.8007, 28.4) centre (-6.4007, 27.2) ccw
  line L12 (-6.4007, 25.2) -> (-13.0007, 25.2)
  arc A21 (-15.0007, 27.2) -> (-13.0007, 25.2) centre (-13.0007, 27.2) ccw
  line L13 (-15.0007, 27.2) -> (-15.0007, 36)
  arc A22 (-11.4007, 37.2) -> (-15.0007, 36) centre (-13.0007, 36) ccw
  line L14 (-11.4007, 37.2) -> (-4.8007, 28.4)
  line L15 (-11.0007, 47) -> (10.9993, 47)
  arc A23 (12.5993, 43.8) -> (10.9993, 47) centre (10.9993, 45) ccw
  line L16 (12.5993, 43.8) -> (1.5993, 29.1333)
  arc A24 (-1.6007, 29.1333) -> (1.5993, 29.1333) centre (-0.0007, 30.3333) ccw
  line L17 (-1.6007, 29.1333) -> (-12.6007, 43.8)
  arc A25 (-11.0007, 47) -> (-12.6007, 43.8) centre (-11.0007, 45) ccw
  circle A26 centre (0, 0) radius 14
  arc A27 (46.1675, 71.3111) -> (47.7675, 68.1111) centre (47.7675, 70.1111) ccw
  line L18 (46.1675, 71.3111) -> (52.7675, 80.1111)
  arc A28 (56.3675, 78.9111) -> (52.7675, 80.1111) centre (54.3675, 78.9111) ccw
  line L19 (56.3675, 78.9111) -> (56.3675, 70.1111)
  arc A29 (54.3675, 68.1111) -> (56.3675, 70.1111) centre (54.3675, 70.1111) ccw
  line L20 (54.3675, 68.1111) -> (47.7675, 68.1111)
  arc A30 (34.9675, 68.1111) -> (36.5675, 71.3111) centre (34.9675, 70.1111) ccw
  line L21 (34.9675, 68.1111) -> (28.3675, 68.1111)
  arc A31 (26.3675, 70.1111) -> (28.3675, 68.1111) centre (28.3675, 70.1111) ccw
  line L22 (26.3675, 70.1111) -> (26.3675, 78.9111)
  arc A32 (29.9675, 80.1111) -> (26.3675, 78.9111) centre (28.3675, 78.9111) ccw
  line L23 (29.9675, 80.1111) -> (36.5675, 71.3111)
  line L24 (30.3675, 89.9111) -> (52.3675, 89.9111)
  arc A33 (53.9675, 86.7111) -> (52.3675, 89.9111) centre (52.3675, 87.9111) ccw
  line L25 (53.9675, 86.7111) -> (42.9675, 72.0445)
  arc A34 (39.7675, 72.0445) -> (42.9675, 72.0445) centre (41.3675, 73.2445) ccw
  line L26 (39.7675, 72.0445) -> (28.7675, 86.7111)
  arc A35 (30.3675, 89.9111) -> (28.7675, 86.7111) centre (30.3675, 87.9111) ccw
  line L27 (-43.0538, 64.8284) -> (-27.8579, 49.6325)
  line L28 (16.1421, 67.8579) -> (-11.9411, 95.9411)
  line L29 (-11.0007, 47) -> (10.9993, 47)
  line L30 (-0.0007, 47) -> (-0.0007, 52)
  line L31 (22, 53.7157) -> (22, 0)
  arc A36 (-22, 35.4903) -> (-27.8579, 49.6325) centre (-42, 35.4903) ccw
  line L32 (-27.8579, 49.6325) -> (3.2548, 80.7452)
  line L33 (-22.0662, 55.4241) -> (-0.0007, 55.4241)
  line L34 (-0.0007, 55.4241) -> (-0.0007, 77.4896)
  dimension "d103" = 5
  dimension "d104" = 22.0655
extrude "돌출12" cut sketch "스케치11" against normal blind 10 contours L32 L34 L33
fillet "모깎기2" radius 2 3 edges at (-22.0662, 55.4241, 2) (-0.0007, 77.4896, 2) (-0.0007, 55.4241, 2)
properties part number "조인트3힌지사이드_4T" material "알루미늄 6061"
